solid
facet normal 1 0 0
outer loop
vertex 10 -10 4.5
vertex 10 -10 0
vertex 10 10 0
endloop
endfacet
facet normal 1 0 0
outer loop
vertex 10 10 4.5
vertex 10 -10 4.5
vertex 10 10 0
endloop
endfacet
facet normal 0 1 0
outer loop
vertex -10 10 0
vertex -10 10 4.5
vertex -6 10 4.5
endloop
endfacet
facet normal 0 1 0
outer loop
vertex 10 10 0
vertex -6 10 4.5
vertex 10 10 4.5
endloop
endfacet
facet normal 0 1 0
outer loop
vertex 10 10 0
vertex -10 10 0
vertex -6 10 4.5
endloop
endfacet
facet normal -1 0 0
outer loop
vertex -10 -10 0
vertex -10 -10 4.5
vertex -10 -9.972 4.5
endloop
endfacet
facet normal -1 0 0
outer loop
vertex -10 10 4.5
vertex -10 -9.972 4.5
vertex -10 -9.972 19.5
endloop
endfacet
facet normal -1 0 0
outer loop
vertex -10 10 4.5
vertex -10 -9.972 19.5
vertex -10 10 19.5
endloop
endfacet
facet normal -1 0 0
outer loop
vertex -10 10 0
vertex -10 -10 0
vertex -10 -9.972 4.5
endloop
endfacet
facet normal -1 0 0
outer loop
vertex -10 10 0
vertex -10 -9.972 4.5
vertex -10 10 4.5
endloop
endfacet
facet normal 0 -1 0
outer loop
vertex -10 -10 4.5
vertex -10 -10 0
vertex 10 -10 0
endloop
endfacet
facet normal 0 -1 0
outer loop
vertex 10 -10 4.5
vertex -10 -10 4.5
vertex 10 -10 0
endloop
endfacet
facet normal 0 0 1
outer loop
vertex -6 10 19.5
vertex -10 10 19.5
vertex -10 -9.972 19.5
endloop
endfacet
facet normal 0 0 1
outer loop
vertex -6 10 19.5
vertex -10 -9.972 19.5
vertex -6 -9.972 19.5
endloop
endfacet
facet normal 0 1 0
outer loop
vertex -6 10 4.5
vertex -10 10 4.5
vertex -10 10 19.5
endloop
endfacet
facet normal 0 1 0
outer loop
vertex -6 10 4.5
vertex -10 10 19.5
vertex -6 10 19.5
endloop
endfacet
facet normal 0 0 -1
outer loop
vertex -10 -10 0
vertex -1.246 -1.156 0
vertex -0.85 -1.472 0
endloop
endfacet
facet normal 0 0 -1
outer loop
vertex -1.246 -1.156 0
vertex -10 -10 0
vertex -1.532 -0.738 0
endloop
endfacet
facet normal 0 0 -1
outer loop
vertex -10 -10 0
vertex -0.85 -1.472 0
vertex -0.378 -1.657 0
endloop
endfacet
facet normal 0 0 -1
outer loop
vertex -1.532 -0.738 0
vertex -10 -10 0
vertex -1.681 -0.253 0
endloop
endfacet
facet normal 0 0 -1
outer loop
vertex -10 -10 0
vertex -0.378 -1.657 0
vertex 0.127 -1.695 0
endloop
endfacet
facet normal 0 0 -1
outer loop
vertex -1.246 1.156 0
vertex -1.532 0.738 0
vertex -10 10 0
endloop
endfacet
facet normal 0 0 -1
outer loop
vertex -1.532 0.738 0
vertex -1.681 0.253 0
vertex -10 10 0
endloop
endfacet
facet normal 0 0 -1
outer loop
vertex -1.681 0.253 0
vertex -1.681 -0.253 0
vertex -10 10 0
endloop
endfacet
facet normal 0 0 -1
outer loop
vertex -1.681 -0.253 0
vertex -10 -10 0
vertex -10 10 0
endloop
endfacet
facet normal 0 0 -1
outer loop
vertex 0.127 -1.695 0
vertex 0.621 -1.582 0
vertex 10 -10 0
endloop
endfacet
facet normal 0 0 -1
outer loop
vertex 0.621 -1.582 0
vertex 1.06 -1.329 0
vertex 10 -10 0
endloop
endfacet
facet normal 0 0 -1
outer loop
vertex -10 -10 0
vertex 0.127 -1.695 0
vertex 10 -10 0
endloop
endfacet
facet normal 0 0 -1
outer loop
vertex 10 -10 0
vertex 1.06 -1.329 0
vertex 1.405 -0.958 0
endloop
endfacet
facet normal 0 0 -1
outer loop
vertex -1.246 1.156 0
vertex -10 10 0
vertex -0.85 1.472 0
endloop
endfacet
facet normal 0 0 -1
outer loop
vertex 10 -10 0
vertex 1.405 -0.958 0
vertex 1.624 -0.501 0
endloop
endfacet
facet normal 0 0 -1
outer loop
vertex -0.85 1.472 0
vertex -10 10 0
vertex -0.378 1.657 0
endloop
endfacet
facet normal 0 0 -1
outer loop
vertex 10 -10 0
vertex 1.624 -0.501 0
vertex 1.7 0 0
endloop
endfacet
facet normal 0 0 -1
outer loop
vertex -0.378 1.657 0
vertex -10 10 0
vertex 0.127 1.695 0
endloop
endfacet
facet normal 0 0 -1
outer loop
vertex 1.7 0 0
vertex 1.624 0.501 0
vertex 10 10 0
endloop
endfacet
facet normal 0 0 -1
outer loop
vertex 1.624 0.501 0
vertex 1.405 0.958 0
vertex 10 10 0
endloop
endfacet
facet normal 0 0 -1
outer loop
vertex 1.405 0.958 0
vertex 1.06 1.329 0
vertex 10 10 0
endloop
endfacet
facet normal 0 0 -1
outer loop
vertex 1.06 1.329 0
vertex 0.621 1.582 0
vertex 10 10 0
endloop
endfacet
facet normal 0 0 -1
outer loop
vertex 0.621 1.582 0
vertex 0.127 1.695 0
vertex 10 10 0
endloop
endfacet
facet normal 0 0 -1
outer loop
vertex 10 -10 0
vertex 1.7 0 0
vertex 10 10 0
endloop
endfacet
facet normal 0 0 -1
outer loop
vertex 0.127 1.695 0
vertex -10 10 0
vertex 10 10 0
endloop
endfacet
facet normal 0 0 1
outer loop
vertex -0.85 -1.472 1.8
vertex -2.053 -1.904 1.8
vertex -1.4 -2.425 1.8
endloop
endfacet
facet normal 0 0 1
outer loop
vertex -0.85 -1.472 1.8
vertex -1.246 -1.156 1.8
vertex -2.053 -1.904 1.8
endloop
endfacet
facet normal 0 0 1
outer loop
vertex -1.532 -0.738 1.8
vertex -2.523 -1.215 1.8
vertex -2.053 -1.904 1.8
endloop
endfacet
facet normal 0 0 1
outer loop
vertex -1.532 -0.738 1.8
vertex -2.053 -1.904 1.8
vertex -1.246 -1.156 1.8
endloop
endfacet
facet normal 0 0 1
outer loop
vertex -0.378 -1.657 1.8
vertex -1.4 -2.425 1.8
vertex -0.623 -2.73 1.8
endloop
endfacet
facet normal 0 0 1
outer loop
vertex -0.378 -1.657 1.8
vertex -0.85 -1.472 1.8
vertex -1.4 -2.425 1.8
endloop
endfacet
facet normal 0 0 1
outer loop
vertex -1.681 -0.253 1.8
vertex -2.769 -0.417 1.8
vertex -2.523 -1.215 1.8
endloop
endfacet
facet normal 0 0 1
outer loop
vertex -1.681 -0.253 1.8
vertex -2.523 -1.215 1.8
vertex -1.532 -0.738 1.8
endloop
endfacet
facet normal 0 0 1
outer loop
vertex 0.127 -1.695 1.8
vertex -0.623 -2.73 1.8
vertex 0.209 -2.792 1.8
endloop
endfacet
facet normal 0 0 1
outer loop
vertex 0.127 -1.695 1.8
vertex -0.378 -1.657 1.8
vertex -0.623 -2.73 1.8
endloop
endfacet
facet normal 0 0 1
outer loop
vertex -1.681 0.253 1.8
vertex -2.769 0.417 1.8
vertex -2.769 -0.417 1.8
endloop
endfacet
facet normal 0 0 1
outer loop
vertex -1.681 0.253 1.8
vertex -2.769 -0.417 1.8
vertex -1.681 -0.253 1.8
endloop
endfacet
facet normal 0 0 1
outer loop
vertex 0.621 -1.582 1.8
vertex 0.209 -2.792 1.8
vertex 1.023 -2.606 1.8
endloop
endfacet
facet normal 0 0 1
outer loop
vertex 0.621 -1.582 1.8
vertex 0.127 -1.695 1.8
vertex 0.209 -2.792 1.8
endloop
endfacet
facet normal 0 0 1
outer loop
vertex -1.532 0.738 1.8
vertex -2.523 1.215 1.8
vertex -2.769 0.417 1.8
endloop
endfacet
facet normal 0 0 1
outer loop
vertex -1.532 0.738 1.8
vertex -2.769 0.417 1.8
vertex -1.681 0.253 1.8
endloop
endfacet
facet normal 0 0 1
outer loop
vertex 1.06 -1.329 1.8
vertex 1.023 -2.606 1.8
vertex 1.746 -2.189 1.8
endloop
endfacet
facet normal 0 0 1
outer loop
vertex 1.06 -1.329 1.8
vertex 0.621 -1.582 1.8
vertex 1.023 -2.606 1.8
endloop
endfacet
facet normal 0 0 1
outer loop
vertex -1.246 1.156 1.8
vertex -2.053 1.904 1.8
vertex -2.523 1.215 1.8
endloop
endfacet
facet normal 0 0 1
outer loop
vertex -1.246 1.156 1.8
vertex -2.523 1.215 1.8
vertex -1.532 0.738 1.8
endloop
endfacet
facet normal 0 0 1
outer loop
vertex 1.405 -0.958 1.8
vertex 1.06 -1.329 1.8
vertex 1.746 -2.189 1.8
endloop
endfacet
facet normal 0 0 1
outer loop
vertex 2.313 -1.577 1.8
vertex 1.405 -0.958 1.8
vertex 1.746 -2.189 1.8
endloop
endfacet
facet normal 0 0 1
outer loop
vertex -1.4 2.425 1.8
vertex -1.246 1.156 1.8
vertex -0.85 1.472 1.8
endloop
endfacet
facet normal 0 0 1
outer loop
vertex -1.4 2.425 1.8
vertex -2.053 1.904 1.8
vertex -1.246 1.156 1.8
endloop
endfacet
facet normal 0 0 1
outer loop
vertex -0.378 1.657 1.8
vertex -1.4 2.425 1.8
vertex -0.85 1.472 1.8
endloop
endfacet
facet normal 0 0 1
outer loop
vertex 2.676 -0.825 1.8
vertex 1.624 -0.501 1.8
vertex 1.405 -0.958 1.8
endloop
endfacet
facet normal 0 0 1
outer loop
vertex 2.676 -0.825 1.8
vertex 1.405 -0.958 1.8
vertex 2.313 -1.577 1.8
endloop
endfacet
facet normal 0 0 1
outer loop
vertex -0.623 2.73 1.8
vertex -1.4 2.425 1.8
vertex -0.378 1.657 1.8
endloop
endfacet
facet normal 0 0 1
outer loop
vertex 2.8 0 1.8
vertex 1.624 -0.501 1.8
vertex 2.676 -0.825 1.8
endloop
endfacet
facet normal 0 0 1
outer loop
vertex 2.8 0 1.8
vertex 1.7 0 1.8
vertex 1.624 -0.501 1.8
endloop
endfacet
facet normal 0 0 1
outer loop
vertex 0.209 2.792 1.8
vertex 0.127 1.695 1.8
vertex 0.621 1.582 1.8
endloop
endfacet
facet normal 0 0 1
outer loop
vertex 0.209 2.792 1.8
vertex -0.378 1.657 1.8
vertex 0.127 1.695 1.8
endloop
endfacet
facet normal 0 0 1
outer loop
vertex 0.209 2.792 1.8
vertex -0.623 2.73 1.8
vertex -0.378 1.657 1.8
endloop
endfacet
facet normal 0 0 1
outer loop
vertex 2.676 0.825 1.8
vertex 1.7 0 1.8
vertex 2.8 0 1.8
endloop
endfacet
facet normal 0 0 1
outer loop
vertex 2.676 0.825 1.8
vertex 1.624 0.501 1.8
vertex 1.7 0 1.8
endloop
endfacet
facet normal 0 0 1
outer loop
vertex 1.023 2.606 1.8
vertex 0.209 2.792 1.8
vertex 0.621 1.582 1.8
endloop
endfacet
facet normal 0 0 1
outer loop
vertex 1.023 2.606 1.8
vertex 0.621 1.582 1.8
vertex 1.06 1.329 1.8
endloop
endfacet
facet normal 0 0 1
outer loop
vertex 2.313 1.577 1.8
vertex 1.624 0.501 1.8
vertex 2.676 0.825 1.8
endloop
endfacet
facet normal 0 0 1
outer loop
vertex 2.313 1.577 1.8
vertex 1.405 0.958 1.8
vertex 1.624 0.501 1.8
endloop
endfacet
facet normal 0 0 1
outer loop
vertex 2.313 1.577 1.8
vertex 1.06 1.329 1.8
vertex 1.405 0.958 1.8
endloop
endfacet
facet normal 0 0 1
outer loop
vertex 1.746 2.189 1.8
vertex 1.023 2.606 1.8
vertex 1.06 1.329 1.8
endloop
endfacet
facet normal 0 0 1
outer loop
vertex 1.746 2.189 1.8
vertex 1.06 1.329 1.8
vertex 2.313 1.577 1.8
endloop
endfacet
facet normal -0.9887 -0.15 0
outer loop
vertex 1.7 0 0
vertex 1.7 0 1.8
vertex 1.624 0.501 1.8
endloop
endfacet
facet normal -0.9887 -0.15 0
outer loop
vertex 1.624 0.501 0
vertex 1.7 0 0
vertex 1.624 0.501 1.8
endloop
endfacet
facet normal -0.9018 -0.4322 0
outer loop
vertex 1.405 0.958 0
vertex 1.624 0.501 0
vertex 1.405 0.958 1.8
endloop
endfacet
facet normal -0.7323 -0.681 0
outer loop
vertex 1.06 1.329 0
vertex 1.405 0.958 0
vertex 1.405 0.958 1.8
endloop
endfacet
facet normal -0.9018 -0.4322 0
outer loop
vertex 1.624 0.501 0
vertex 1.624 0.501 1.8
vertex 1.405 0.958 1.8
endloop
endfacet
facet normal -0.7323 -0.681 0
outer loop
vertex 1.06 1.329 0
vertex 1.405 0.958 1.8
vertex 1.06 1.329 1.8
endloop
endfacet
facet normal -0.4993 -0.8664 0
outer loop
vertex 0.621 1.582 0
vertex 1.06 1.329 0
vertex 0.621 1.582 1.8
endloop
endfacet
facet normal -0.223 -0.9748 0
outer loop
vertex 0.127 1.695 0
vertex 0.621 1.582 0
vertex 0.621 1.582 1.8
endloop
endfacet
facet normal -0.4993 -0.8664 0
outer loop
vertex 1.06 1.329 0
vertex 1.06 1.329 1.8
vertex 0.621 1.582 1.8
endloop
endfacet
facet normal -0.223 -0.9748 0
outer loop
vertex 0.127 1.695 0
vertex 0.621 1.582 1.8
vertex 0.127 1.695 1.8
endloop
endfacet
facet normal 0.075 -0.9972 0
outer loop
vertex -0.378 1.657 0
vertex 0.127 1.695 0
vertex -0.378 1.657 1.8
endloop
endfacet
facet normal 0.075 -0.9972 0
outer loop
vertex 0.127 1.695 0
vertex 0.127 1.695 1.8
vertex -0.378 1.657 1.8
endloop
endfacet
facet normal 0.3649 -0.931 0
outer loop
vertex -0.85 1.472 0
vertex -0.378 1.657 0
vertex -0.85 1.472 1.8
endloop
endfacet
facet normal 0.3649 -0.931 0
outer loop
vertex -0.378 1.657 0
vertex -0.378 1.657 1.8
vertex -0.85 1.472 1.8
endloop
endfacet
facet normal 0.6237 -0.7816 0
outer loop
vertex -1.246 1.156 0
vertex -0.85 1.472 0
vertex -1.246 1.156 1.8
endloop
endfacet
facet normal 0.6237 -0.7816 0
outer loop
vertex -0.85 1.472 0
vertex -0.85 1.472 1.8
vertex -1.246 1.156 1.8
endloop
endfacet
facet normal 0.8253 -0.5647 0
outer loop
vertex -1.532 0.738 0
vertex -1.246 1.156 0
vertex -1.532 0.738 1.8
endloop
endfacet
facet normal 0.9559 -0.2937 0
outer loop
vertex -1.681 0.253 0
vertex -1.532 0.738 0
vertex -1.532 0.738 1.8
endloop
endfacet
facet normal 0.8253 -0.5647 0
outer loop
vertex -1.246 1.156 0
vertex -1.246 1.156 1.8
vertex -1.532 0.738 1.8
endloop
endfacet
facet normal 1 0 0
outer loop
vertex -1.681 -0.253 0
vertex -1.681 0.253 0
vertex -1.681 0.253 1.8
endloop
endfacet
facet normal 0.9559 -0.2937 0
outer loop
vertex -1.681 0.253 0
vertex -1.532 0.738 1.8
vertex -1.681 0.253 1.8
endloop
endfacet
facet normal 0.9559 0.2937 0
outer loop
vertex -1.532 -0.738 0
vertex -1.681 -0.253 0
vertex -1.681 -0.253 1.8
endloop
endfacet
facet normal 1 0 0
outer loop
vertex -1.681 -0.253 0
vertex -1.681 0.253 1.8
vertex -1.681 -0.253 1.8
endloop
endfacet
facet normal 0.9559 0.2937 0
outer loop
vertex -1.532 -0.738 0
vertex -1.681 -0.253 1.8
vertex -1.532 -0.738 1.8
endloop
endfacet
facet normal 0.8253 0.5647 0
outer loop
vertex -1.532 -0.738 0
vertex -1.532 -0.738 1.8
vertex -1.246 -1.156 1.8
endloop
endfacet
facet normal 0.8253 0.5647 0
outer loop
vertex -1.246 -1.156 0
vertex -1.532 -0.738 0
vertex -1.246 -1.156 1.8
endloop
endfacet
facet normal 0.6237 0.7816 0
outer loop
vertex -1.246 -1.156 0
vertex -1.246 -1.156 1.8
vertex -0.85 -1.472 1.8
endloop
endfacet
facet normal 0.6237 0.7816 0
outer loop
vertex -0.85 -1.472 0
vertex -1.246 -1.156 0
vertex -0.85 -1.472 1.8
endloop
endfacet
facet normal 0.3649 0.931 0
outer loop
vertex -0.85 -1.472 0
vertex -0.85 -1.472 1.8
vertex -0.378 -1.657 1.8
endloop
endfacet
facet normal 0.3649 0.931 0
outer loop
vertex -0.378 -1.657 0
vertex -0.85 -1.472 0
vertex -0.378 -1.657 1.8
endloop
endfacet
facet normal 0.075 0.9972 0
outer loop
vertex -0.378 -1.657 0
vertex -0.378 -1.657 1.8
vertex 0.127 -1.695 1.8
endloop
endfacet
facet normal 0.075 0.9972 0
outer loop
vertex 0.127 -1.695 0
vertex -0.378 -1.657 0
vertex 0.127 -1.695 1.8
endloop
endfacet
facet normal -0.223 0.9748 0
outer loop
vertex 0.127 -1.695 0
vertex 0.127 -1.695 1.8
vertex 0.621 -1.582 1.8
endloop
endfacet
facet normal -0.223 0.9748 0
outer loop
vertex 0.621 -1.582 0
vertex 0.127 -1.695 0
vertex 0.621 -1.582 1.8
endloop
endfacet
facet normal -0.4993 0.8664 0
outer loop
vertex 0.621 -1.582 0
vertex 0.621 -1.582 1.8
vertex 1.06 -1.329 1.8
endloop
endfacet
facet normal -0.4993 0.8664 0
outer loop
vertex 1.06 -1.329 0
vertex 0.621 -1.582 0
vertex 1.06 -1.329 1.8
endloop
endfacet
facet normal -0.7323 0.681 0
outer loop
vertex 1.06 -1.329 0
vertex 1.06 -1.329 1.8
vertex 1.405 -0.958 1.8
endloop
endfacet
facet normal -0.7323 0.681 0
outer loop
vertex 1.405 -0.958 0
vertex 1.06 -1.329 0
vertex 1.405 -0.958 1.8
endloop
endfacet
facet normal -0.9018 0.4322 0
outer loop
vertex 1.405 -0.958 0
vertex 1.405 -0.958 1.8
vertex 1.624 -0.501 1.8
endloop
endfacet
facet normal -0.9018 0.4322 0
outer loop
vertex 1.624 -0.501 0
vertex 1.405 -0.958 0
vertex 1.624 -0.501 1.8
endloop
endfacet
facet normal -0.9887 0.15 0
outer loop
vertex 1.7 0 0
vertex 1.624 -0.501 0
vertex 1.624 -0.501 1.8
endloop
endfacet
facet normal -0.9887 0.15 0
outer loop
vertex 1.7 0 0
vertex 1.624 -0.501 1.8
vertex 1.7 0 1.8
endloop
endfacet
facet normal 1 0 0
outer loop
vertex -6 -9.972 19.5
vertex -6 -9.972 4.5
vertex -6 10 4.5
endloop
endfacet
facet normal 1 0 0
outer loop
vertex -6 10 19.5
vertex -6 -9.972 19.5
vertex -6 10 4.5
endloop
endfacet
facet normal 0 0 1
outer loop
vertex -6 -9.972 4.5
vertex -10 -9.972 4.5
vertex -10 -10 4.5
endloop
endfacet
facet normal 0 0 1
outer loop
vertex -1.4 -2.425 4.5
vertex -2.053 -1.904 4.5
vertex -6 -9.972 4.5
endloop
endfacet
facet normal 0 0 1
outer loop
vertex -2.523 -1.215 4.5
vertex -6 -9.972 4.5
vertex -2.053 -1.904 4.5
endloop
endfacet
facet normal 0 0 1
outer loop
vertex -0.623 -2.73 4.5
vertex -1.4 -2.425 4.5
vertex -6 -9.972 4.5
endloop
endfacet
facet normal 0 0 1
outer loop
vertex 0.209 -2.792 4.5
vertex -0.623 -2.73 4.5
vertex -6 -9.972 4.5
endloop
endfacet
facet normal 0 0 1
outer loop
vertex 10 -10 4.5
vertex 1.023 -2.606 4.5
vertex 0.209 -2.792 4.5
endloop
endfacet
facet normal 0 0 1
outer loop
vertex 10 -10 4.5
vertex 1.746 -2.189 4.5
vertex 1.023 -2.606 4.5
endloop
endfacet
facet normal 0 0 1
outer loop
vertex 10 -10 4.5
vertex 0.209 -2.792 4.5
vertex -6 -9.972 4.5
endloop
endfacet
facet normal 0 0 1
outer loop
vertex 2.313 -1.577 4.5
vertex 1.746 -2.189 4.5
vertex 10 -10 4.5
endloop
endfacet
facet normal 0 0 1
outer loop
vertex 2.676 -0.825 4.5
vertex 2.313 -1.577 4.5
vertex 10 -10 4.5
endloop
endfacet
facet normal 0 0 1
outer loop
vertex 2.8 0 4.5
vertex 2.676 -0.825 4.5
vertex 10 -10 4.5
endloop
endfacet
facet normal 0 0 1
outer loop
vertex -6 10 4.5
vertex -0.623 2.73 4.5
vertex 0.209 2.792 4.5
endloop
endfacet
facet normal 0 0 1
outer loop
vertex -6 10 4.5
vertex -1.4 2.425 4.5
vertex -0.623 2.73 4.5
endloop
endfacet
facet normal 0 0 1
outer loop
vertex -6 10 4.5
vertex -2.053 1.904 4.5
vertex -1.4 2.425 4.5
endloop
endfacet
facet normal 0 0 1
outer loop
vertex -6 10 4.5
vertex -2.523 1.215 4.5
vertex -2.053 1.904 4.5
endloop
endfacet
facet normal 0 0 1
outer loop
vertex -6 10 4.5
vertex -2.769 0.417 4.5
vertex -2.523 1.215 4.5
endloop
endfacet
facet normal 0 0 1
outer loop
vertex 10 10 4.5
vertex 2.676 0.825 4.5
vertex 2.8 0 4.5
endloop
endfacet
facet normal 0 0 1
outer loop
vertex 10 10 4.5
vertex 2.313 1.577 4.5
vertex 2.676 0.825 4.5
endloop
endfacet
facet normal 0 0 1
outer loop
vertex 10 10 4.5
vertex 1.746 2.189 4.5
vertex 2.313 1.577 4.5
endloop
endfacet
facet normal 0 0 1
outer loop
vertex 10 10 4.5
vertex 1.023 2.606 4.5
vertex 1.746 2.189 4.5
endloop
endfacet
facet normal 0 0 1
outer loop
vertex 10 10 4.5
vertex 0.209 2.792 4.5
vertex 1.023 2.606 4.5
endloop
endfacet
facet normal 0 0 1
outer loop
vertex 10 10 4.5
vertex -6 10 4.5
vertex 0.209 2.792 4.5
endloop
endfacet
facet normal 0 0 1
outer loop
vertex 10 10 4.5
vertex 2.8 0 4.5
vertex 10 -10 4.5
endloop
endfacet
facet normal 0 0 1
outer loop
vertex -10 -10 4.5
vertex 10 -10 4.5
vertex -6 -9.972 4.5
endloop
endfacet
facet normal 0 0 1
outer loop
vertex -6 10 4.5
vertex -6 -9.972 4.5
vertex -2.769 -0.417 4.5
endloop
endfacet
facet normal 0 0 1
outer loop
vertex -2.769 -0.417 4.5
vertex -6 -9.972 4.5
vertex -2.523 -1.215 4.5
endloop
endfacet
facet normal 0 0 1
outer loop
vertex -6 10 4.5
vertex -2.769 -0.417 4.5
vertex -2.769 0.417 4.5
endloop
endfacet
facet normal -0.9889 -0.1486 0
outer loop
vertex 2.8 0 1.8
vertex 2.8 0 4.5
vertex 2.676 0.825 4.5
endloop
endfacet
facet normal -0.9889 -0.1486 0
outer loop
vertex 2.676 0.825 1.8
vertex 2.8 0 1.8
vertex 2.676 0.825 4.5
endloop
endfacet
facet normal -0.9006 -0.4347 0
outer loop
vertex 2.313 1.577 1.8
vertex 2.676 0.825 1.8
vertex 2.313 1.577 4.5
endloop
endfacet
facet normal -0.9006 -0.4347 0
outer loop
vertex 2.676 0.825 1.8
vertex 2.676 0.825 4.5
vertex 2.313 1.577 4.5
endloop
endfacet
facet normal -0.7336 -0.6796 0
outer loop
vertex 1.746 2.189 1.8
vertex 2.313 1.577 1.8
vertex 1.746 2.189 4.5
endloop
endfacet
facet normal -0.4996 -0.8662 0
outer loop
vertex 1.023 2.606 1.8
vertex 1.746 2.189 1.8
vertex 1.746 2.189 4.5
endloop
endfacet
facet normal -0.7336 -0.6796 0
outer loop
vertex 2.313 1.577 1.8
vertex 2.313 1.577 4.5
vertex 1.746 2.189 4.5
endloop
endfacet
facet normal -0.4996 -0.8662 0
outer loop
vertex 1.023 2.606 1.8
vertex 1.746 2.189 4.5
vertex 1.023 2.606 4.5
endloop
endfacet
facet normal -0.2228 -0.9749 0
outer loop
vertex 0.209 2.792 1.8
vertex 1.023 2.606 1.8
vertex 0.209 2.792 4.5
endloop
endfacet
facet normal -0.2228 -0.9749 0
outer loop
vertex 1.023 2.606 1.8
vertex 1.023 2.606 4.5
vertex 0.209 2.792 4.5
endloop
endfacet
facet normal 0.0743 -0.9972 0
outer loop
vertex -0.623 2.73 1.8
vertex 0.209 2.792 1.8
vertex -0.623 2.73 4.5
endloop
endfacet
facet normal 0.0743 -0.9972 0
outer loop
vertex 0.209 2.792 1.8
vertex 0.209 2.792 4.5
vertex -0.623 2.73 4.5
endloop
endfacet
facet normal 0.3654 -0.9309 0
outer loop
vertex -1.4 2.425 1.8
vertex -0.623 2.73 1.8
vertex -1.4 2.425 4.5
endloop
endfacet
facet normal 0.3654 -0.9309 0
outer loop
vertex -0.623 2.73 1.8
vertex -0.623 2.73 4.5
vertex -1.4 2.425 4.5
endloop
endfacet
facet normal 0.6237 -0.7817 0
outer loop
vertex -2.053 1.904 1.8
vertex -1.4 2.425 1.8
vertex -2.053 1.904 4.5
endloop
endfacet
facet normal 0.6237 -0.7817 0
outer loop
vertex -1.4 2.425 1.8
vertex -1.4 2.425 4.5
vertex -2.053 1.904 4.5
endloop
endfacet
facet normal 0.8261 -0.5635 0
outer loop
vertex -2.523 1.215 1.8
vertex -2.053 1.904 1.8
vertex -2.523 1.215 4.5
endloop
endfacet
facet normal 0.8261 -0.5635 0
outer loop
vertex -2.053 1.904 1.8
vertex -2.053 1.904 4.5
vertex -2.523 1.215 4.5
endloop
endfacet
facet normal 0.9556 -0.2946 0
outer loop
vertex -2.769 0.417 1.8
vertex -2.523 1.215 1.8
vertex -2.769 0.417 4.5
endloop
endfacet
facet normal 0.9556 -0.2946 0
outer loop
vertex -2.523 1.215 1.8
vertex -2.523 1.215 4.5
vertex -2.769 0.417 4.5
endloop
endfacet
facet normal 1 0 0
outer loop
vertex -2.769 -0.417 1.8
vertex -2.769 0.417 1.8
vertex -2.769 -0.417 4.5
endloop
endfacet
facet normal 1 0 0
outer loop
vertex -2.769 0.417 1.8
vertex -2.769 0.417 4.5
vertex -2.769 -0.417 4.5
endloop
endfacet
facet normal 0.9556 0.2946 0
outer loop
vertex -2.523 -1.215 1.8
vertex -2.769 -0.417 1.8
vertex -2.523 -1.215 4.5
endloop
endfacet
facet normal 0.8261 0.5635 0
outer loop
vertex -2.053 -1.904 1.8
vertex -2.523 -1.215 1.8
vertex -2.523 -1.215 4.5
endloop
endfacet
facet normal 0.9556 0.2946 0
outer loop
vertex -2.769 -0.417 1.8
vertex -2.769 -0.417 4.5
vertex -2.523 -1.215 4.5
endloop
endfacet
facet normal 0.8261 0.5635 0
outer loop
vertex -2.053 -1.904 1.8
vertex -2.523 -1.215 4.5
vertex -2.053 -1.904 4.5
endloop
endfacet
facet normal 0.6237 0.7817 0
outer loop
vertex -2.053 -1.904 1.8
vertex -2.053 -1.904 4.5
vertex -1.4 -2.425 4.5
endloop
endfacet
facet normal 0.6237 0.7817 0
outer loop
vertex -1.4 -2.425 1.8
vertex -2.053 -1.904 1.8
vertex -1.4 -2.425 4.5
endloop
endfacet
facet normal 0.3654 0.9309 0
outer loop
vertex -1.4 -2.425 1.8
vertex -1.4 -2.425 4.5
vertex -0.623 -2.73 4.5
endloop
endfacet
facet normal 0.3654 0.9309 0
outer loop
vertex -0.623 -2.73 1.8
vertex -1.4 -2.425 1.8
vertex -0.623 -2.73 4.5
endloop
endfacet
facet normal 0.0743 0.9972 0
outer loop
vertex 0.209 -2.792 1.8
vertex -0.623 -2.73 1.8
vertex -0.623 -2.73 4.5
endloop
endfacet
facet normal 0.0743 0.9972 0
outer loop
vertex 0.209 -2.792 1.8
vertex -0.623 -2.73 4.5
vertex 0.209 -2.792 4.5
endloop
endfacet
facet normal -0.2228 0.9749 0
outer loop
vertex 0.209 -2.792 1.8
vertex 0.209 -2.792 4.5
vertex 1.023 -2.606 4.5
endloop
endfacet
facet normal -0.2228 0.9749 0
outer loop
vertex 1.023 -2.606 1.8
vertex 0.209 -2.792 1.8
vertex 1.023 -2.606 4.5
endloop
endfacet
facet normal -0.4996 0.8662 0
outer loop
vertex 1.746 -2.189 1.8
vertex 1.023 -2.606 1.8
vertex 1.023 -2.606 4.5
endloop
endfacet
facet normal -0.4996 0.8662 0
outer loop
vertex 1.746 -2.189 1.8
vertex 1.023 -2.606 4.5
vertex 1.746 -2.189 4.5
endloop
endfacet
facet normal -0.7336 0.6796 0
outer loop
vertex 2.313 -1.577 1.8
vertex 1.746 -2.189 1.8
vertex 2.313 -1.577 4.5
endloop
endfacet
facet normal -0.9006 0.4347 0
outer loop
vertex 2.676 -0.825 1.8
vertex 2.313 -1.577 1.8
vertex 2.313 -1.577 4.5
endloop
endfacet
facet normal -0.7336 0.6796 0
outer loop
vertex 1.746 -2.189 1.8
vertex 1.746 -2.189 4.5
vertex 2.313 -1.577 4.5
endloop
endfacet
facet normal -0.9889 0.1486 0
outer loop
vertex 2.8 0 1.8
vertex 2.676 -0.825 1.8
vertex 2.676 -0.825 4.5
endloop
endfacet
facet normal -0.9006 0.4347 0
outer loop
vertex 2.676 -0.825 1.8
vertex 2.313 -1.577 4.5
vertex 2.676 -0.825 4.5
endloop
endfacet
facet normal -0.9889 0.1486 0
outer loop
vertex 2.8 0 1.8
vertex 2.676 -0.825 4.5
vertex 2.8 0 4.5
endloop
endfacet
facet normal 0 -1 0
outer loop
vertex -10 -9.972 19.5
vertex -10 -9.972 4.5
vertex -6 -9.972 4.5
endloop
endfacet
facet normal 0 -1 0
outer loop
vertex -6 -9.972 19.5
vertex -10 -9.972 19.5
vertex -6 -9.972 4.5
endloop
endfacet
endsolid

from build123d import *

# Parameters (mm, degrees)
SKETCH_W        = 20
SKETCH_H        = 20
PAD_DEPTH       = 4.5
SKETCH001_R     = 1.7
POCKET_DEPTH    = 5
SKETCH002_R     = 2.8
POCKET001_DEPTH = 2.7
SKETCH003_W     = 4
SKETCH003_H     = 19.972413
PAD001_DEPTH    = 15


with BuildPart() as part:
    # Sketch → Pad (new body)
    with BuildSketch(Plane.XY):
        Rectangle(SKETCH_W, SKETCH_H)
    extrude(amount=PAD_DEPTH)

    # Sketch001 (on Face6 of Pad) → Pocket (cut)
    with BuildSketch(Plane.XY.offset(4.5)):
        Circle(SKETCH001_R)
    extrude(amount=-POCKET_DEPTH, mode=Mode.SUBTRACT)

    # Sketch002 (on Face5 of Pocket) → Pocket001 (cut)
    with BuildSketch(Plane.XY.offset(4.5)):
        Circle(SKETCH002_R)
    extrude(amount=-POCKET001_DEPTH, mode=Mode.SUBTRACT)

    # Sketch003 (on Face5 of Pocket001) → Pad001 (join)
    with BuildSketch(Plane.XY.offset(4.5)):
        with Locations((-8, 0.013794)):
            Rectangle(SKETCH003_W, SKETCH003_H)
    extrude(amount=PAD001_DEPTH)


solid = part.part
